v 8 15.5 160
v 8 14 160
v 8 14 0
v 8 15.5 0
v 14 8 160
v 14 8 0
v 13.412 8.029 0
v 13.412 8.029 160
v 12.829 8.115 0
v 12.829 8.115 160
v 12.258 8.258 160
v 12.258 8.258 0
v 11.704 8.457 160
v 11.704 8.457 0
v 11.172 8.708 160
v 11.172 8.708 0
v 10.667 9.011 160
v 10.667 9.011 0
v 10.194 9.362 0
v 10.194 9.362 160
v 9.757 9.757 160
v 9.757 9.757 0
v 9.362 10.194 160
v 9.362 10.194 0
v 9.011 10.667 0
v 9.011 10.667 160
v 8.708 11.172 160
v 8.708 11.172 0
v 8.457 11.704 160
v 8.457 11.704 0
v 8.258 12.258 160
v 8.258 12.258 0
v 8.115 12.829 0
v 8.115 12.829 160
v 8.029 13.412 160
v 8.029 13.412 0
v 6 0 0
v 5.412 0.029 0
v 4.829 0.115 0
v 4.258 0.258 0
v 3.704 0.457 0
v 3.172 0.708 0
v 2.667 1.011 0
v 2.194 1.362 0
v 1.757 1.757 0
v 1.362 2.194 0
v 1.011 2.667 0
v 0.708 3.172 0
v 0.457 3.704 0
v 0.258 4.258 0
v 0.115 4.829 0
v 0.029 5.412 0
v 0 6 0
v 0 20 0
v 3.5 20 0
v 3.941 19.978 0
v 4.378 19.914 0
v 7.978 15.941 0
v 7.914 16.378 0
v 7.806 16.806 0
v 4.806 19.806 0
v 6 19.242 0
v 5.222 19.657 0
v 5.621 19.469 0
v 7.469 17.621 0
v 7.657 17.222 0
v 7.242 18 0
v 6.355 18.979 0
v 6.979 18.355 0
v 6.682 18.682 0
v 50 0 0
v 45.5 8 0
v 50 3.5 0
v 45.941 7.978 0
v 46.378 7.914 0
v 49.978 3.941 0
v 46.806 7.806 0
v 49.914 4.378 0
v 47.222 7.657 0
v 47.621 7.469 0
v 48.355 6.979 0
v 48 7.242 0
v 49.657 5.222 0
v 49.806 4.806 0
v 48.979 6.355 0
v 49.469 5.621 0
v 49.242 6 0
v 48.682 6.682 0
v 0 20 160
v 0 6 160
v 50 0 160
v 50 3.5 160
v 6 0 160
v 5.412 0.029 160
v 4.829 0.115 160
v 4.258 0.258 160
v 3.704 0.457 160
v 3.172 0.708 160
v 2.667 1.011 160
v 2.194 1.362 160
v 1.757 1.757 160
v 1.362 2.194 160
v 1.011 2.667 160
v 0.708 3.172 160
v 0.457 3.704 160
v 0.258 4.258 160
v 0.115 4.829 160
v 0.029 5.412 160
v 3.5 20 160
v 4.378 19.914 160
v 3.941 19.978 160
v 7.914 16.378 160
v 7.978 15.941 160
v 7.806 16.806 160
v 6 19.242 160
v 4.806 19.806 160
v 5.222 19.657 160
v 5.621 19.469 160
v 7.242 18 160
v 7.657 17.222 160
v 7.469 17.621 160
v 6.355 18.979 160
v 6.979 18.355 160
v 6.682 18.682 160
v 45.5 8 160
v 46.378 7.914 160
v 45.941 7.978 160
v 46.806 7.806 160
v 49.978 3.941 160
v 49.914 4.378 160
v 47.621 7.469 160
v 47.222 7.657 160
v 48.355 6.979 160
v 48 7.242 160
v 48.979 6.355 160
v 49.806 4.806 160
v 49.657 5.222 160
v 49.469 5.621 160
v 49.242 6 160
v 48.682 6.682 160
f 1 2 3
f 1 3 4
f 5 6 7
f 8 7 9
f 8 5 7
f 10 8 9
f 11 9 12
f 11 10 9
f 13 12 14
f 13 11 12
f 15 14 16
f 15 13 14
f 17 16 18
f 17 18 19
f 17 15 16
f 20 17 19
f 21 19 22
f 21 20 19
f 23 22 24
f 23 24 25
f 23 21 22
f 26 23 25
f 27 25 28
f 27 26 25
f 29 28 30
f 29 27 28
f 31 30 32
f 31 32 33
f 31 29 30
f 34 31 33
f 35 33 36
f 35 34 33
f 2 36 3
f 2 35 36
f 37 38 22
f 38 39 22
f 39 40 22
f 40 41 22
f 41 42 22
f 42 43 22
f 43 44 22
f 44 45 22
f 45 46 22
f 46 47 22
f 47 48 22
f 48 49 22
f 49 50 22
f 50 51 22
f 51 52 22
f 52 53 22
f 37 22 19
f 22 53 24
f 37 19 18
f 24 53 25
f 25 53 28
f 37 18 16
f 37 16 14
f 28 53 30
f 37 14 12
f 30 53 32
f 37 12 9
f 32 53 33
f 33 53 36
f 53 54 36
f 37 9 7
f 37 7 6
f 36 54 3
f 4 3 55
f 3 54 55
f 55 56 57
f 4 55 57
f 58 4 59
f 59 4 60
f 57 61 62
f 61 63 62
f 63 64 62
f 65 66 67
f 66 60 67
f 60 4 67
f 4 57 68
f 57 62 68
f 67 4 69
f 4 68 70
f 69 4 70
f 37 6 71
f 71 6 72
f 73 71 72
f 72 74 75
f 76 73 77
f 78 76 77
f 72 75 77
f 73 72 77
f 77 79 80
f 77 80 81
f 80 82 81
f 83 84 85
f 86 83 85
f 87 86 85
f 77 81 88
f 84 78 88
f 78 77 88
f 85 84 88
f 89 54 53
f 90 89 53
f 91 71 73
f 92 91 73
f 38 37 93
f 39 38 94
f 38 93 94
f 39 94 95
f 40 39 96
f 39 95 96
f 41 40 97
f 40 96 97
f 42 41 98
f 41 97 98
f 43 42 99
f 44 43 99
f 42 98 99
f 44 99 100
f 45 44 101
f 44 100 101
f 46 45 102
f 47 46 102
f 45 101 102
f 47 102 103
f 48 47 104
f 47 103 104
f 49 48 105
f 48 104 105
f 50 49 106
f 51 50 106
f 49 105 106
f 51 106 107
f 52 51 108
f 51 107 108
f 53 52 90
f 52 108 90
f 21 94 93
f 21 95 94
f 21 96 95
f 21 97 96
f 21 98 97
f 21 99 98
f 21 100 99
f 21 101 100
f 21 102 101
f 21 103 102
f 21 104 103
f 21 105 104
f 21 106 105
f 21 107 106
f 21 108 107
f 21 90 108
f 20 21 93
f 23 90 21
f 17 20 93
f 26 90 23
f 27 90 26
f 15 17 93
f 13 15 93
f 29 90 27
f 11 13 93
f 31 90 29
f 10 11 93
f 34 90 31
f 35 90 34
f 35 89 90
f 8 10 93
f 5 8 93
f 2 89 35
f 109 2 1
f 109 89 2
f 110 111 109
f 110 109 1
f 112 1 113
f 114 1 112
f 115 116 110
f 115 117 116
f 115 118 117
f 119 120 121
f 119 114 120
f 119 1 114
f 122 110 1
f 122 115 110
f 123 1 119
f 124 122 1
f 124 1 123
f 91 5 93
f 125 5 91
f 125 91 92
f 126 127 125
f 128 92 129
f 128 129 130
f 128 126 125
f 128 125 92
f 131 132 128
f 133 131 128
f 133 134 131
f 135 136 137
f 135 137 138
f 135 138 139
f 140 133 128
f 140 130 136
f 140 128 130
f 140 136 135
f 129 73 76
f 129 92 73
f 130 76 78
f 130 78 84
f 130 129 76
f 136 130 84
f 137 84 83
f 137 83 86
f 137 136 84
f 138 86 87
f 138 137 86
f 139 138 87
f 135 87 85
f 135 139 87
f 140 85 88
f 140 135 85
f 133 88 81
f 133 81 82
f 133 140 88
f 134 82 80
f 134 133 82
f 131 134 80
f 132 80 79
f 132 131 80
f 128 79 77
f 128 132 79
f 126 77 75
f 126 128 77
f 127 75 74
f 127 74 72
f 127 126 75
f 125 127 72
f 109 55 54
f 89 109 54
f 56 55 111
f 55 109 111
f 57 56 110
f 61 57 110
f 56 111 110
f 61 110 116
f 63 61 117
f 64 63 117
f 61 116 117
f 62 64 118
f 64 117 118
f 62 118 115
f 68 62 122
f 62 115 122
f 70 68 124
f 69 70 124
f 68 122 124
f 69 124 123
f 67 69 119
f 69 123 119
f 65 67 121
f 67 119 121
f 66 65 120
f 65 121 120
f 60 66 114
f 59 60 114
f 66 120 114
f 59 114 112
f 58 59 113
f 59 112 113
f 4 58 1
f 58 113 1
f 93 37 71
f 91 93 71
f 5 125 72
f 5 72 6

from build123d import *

# Parameters (mm, degrees)
PAD_DEPTH   = 160
FILLET_R    = 6
FILLET001_R = 4.5
FILLET002_R = 6


with BuildPart() as part:
    # Sketch → Pad (new body)
    with BuildSketch(Plane.XY):
        Polygon((0, 0), (50, 0), (50, 8), (8, 8), (8, 20), (0, 20), align=None)
    extrude(amount=PAD_DEPTH)

    # Fillet
    fillet_edges = [part.edges().sort_by_distance(p)[0] for p in [
        (0, 0, 80),
    ]]
    fillet(fillet_edges, radius=FILLET_R)

    # Fillet001
    fillet001_edges = [part.edges().sort_by_distance(p)[0] for p in [
        (50, 8, 80),
        (8, 20, 80),
    ]]
    fillet(fillet001_edges, radius=FILLET001_R)

    # Fillet002
    fillet002_edges = [part.edges().sort_by_distance(p)[0] for p in [
        (8, 8, 80),
    ]]
    fillet(fillet002_edges, radius=FILLET002_R)


solid = part.part
